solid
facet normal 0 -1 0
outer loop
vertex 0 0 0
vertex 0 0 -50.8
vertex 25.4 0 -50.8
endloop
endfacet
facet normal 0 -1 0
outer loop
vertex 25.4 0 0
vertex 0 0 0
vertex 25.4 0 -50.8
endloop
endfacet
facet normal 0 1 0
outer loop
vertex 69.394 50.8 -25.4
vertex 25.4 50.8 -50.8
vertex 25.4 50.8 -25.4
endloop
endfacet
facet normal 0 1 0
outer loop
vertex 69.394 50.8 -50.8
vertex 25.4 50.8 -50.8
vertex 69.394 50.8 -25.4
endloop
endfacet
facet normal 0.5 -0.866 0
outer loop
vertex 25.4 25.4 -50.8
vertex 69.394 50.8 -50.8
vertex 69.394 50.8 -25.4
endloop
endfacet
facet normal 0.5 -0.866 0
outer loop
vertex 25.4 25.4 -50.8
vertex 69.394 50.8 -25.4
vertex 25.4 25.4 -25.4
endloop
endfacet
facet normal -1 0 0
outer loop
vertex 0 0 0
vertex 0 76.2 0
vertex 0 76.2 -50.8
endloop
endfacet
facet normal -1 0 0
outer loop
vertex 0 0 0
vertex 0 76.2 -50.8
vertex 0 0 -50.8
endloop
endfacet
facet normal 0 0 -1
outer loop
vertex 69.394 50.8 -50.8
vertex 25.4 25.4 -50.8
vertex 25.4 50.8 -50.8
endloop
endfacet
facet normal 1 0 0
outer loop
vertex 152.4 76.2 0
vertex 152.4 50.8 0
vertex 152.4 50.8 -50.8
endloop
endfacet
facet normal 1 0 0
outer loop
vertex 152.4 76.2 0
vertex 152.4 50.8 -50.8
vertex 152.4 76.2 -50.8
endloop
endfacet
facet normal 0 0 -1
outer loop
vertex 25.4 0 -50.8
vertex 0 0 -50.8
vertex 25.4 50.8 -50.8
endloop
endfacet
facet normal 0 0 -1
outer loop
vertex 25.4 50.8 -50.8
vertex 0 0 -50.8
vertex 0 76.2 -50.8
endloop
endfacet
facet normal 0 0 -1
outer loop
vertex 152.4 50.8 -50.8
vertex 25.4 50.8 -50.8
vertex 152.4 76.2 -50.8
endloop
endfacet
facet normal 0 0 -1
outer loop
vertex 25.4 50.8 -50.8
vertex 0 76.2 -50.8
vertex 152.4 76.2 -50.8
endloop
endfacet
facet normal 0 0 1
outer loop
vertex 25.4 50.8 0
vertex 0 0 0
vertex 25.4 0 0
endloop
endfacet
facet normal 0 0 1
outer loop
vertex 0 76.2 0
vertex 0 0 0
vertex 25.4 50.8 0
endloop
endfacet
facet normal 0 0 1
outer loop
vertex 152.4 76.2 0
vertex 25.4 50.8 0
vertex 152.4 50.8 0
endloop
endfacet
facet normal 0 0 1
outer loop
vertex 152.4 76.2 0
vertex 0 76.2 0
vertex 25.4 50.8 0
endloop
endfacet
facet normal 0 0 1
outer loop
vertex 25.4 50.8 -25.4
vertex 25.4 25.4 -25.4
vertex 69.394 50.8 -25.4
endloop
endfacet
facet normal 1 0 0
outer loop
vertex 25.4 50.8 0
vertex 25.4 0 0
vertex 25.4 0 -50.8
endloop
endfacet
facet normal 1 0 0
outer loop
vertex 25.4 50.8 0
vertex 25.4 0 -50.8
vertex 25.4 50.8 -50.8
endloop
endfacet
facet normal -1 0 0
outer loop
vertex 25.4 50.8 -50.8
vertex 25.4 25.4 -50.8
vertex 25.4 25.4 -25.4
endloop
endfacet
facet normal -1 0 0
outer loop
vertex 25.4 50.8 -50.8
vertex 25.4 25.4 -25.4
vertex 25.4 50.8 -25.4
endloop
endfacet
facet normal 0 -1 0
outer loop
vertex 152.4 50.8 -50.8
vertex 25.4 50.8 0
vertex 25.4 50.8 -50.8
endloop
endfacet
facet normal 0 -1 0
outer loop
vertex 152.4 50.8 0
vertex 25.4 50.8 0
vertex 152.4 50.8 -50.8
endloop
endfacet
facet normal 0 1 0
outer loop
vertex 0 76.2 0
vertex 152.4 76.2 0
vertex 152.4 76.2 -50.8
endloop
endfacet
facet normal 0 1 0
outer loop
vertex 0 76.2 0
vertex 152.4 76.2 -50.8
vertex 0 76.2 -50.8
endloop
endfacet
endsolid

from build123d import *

# Parameters (mm, degrees)
F1_DEPTH = 50.8
F3_DEPTH = 25.4


with BuildPart() as f1:
    # F0 (on Top) → F1 (new body)
    with BuildSketch(Plane.XY):
        Polygon((0, 76.2), (0, 0), (25.4, 0), (25.4, 50.8), (152.4, 50.8), (152.4, 76.2), align=None)
    extrude(amount=-F1_DEPTH)


with BuildPart() as f3:
    # F2 (on face) → F3 (new body)
    with BuildSketch(Plane(origin=(0, 0, -50.8), x_dir=(1, 0, 0), z_dir=(0, 0, -1))):
        Polygon((69.394091, -50.8), (25.4, -25.4), (25.4, -50.8), align=None)
    extrude(amount=-F3_DEPTH)


solid = Compound([f1.part, f3.part])
